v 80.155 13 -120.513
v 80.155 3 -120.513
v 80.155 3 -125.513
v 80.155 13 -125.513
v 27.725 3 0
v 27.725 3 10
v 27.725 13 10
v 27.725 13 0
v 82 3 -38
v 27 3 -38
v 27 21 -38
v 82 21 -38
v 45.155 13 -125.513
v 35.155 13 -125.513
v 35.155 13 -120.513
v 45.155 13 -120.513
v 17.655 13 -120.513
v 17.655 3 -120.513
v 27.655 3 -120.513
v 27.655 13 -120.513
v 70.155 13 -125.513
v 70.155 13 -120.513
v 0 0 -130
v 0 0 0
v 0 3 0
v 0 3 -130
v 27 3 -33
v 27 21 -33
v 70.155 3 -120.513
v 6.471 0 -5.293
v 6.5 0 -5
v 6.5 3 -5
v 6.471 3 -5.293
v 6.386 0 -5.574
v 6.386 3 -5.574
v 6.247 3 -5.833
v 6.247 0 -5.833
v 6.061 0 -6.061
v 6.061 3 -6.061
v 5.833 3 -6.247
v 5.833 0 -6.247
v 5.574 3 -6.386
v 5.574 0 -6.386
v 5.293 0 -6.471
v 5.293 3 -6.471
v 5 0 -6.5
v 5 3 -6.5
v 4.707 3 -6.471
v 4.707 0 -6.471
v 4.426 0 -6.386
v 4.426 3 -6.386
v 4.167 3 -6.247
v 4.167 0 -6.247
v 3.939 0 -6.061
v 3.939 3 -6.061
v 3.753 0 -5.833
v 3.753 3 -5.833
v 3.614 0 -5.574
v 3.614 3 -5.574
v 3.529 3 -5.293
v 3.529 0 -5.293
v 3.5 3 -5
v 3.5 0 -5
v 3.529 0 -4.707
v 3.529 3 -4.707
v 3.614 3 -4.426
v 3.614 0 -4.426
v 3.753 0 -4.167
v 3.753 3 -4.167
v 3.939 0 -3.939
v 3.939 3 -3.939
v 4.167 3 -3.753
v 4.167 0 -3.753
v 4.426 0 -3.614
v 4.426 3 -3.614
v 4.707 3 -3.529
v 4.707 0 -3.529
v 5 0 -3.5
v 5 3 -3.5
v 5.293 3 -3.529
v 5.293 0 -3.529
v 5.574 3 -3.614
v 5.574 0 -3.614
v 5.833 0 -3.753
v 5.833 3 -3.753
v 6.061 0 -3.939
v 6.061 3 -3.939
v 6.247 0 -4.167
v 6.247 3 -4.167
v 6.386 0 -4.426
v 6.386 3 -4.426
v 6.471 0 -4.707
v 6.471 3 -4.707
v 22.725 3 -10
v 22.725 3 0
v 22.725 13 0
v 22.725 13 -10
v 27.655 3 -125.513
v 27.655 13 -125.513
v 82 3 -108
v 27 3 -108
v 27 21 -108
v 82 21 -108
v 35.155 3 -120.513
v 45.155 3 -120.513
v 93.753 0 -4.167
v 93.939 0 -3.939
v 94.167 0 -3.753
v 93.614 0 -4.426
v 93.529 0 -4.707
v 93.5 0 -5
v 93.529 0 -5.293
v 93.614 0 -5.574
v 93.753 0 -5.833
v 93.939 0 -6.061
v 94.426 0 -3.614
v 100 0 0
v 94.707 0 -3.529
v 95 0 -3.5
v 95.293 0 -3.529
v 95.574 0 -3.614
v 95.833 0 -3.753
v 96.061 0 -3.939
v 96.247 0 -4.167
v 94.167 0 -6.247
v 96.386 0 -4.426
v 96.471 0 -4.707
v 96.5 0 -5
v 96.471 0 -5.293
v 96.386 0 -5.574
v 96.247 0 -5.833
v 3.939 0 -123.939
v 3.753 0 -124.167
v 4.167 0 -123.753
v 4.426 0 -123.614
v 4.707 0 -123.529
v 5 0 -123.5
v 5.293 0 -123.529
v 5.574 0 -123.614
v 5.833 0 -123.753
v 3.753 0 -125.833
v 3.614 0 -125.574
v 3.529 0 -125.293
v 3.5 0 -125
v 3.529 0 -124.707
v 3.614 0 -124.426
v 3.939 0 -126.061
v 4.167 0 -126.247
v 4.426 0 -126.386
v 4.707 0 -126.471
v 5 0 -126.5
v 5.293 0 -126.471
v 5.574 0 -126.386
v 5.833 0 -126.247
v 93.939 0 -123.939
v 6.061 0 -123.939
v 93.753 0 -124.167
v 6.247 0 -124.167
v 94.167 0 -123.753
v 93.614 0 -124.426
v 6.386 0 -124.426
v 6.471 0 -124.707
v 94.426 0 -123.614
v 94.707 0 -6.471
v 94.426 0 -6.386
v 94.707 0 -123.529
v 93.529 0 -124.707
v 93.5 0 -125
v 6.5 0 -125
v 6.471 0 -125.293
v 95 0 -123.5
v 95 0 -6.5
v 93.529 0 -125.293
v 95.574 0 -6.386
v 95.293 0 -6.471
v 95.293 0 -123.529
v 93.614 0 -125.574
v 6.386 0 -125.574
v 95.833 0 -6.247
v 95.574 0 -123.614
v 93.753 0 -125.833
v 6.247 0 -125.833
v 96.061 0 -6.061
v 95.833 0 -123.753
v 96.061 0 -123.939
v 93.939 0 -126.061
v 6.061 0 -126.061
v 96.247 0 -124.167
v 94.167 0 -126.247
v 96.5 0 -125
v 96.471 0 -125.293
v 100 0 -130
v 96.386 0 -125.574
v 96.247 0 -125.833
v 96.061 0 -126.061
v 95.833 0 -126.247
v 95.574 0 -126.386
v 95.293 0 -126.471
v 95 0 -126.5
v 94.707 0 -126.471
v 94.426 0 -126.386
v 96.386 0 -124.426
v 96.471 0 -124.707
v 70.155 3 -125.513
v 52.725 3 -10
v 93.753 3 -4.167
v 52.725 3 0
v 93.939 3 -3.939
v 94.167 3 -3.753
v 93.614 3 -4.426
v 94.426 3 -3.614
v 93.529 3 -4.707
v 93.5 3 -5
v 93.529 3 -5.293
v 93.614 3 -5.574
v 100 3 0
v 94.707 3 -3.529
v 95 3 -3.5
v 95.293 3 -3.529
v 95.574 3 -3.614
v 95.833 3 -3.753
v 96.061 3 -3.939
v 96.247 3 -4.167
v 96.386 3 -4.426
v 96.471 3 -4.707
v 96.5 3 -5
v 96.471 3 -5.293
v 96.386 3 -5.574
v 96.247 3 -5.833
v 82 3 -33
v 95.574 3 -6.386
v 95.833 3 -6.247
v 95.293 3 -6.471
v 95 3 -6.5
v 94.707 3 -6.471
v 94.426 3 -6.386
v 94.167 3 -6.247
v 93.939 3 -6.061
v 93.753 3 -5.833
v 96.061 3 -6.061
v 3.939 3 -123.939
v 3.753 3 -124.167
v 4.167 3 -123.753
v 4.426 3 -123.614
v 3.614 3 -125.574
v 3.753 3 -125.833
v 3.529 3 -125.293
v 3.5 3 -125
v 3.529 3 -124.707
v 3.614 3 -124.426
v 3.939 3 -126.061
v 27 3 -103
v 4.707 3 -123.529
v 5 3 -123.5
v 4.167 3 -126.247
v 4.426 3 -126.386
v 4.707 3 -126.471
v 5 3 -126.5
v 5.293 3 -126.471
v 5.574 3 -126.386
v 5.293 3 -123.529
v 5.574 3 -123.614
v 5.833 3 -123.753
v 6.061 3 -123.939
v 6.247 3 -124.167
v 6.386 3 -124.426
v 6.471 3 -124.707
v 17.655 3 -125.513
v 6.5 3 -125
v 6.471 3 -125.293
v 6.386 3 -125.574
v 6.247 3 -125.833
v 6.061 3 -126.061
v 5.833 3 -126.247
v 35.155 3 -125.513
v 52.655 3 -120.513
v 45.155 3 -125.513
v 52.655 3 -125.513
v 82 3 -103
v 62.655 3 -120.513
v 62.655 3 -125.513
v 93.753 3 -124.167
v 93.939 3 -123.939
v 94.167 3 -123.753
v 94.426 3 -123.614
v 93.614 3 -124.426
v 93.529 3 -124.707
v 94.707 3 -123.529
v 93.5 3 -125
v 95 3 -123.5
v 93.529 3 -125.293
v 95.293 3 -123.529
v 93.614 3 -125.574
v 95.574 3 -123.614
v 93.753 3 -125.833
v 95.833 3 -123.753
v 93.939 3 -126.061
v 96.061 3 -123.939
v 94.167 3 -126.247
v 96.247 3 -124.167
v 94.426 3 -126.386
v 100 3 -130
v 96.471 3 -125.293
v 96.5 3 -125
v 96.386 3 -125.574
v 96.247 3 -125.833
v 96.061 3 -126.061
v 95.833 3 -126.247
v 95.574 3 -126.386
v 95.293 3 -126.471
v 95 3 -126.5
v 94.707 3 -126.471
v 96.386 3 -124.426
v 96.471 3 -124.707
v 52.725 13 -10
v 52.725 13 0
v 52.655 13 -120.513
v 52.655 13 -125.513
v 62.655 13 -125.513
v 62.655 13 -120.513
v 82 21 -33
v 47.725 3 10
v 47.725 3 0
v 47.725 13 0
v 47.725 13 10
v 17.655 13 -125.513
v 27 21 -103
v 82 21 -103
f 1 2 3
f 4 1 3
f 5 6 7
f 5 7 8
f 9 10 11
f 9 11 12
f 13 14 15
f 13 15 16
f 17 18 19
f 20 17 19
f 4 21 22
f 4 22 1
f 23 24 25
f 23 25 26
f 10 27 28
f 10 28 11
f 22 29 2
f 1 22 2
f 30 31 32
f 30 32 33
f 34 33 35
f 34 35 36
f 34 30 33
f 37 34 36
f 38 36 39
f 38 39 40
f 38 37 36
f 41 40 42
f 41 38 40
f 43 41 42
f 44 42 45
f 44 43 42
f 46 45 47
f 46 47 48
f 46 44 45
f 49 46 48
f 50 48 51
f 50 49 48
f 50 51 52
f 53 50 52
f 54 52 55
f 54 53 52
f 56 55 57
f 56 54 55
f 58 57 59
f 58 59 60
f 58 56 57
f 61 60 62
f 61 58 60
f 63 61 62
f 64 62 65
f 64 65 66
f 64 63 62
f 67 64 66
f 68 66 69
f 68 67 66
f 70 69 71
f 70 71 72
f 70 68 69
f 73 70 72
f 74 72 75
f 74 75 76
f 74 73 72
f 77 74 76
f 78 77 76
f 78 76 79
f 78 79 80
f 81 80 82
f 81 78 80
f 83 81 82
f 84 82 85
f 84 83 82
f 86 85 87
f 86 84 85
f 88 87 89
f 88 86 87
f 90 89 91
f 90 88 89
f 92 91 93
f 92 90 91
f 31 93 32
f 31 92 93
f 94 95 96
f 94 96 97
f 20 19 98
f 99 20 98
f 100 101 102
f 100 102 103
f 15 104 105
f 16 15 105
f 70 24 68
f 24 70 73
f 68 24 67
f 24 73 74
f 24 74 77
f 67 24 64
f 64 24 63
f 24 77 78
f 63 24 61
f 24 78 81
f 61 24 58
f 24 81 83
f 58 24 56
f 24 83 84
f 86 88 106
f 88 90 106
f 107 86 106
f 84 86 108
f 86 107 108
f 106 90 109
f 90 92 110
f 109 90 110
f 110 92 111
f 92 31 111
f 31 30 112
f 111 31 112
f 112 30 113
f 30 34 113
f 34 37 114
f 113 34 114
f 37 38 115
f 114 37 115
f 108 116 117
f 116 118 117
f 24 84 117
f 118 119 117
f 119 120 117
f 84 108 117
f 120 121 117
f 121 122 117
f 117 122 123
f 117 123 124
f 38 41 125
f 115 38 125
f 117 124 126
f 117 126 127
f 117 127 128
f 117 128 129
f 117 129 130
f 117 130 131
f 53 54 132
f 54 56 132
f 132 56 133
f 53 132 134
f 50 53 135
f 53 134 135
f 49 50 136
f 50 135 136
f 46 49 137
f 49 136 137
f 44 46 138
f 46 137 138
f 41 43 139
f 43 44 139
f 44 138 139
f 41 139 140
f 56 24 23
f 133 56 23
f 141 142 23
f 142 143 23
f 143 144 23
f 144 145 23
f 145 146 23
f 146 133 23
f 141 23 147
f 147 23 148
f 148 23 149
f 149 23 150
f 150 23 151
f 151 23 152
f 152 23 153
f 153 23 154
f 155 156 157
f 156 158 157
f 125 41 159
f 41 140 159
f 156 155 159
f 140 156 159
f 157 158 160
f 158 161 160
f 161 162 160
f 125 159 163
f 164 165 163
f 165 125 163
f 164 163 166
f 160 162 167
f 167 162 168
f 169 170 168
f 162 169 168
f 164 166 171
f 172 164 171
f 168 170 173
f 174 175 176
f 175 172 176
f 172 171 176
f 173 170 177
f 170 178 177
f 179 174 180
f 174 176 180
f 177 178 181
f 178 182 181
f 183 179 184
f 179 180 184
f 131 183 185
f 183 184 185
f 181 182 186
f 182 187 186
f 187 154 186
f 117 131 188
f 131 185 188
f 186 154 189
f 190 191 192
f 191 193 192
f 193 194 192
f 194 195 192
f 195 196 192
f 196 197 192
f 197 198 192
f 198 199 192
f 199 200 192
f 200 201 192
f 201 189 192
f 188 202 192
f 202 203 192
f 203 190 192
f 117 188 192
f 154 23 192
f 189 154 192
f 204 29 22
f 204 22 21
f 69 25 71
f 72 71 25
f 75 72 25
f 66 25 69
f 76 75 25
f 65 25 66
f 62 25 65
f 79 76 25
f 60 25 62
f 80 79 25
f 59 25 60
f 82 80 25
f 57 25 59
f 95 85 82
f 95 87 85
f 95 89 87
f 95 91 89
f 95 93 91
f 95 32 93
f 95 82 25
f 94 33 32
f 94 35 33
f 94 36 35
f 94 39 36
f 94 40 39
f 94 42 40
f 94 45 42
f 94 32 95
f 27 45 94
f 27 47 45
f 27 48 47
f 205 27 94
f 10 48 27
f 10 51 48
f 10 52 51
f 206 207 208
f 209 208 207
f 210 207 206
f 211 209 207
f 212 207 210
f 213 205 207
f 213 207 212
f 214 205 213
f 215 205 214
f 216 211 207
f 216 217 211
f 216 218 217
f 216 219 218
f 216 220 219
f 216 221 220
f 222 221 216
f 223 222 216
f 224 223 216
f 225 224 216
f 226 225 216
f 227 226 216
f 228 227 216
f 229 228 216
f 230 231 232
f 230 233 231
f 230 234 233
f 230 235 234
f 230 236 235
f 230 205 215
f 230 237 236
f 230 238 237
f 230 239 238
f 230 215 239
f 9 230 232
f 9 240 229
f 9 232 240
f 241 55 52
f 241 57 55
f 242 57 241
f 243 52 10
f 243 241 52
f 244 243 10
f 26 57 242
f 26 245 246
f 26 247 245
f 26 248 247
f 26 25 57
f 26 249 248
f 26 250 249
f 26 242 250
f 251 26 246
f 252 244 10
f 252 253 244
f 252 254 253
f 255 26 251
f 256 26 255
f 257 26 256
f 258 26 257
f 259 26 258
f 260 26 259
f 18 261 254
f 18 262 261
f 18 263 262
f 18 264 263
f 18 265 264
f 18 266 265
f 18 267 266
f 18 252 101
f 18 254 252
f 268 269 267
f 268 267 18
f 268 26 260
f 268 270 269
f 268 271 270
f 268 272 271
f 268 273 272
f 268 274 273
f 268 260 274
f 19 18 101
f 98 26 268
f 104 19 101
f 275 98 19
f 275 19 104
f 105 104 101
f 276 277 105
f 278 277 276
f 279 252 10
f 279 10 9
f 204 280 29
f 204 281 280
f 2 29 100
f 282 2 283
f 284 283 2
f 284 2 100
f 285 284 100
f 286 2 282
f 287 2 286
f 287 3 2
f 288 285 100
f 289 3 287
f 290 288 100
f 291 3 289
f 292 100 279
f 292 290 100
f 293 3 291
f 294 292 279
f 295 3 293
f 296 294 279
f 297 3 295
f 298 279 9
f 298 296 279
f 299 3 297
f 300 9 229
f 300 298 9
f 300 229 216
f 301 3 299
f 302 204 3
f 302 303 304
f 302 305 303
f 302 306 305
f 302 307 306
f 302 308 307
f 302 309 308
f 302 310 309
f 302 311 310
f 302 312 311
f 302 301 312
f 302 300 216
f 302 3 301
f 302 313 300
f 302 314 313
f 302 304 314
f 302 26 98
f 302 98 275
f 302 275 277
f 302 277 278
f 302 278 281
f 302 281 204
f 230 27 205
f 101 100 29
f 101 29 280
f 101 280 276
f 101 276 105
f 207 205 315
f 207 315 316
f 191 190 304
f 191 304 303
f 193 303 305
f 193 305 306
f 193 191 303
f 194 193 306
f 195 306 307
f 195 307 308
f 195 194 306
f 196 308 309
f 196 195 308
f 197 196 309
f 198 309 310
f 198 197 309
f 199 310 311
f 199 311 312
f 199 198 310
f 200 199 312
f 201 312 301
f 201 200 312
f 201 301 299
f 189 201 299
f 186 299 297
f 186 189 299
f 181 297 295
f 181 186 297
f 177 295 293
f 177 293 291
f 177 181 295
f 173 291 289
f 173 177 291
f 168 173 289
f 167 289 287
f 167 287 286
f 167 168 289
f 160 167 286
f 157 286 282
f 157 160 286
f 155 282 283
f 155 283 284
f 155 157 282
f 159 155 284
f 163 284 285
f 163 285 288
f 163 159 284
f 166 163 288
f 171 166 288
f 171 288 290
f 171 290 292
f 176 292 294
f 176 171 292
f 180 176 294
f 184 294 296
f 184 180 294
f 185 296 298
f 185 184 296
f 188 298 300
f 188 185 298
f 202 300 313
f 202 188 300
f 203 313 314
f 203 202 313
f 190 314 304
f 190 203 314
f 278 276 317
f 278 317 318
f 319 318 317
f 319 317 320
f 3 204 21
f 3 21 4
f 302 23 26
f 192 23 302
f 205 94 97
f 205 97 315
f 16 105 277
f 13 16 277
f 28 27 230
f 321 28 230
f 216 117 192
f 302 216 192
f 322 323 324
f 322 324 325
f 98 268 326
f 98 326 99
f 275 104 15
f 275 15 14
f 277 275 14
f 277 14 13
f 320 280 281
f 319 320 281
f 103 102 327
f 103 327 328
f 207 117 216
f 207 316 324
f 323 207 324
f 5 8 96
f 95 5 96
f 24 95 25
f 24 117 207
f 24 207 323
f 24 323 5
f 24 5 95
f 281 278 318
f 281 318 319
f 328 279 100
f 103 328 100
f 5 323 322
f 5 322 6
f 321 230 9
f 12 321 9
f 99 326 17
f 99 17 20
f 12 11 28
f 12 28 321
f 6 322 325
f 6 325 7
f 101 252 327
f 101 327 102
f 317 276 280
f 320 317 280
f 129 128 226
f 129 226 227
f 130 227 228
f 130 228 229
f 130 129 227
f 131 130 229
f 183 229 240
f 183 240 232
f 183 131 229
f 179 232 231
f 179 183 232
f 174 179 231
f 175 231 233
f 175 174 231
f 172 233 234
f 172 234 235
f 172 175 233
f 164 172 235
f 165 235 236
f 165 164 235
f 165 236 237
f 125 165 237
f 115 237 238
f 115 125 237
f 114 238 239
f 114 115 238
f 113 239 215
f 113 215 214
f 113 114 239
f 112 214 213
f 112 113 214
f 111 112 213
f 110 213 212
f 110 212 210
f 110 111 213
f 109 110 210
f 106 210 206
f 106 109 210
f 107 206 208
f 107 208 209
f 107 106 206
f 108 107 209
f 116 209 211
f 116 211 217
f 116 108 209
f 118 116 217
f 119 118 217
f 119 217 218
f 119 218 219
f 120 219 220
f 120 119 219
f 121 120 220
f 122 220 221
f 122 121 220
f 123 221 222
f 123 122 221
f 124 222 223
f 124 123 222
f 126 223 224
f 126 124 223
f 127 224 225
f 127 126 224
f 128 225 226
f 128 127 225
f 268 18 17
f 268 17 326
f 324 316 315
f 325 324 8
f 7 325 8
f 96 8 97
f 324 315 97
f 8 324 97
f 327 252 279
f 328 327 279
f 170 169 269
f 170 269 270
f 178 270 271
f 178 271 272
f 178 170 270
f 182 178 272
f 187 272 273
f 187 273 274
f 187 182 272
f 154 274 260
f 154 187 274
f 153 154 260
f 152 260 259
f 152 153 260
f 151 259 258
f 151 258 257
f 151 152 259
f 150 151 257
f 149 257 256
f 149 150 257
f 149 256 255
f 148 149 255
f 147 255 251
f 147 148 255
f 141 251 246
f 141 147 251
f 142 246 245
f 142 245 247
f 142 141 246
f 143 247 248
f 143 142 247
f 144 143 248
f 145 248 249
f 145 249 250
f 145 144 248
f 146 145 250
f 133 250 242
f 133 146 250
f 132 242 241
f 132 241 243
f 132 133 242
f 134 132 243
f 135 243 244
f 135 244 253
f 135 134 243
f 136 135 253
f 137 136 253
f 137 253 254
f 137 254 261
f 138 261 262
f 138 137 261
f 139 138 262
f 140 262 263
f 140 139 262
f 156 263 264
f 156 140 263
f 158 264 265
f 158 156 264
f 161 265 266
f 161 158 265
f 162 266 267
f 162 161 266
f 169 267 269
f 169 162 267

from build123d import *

# Parameters (mm, degrees)
ESQUISSE1_W      = 100
ESQUISSE1_H      = 130
ESQUISSE1_R      = 1.5
EXTRUSION1_DEPTH = 3
ESQUISSE2_W      = 55
ESQUISSE2_H      = 5
EXTRUSION2_DEPTH = 18
EXTRUSION3_DEPTH = 10
ESQUISSE4_W      = 10
ESQUISSE4_H      = 5
EXTRUSION4_DEPTH = 10


with BuildPart() as part:
    # Esquisse1 → Extrusion1 (new body)
    with BuildSketch(Plane(origin=(0, 0, 0), x_dir=(1, 0, 0), z_dir=(0, 1, 0))):
        with Locations((50, 65)):
            Rectangle(ESQUISSE1_W, ESQUISSE1_H)
        with Locations((5, 125)):
            Circle(ESQUISSE1_R, mode=Mode.SUBTRACT)
        with Locations((95, 125)):
            Circle(ESQUISSE1_R, mode=Mode.SUBTRACT)
        with Locations((95, 5)):
            Circle(ESQUISSE1_R, mode=Mode.SUBTRACT)
        with Locations((5, 5)):
            Circle(ESQUISSE1_R, mode=Mode.SUBTRACT)
    extrude(amount=EXTRUSION1_DEPTH)

    # Esquisse2 → Extrusion2 (add)
    with BuildSketch(Plane(origin=(0, 3, 0), x_dir=(1, 0, 0), z_dir=(0, 1, 0))):
        with Locations((54.5, 105.5)):
            Rectangle(ESQUISSE2_W, ESQUISSE2_H)
        with Locations((54.5, 35.5)):
            Rectangle(ESQUISSE2_W, ESQUISSE2_H)
    extrude(amount=EXTRUSION2_DEPTH)

    # Esquisse3 → Extrusion3 (add)
    with BuildSketch(Plane(origin=(0, 3, 0), x_dir=(1, 0, 0), z_dir=(0, 1, 0))):
        Polygon((22.725382584, 0), (22.725382584, 10), (52.725382584, 10), (52.725382584, 0), (47.725382584, 0), (47.725382584, -10), (27.725382584, -10), (27.725382584, 0), align=None)
    extrude(amount=EXTRUSION3_DEPTH)

    # Esquisse4 → Extrusion4 (add)
    with BuildSketch(Plane(origin=(0, 3, 0), x_dir=(1, 0, 0), z_dir=(0, 1, 0))):
        with Locations((22.654691777, 123.012698359)):
            Rectangle(ESQUISSE4_W, ESQUISSE4_H)
        with Locations((40.154691777, 123.012698359)):
            Rectangle(ESQUISSE4_W, ESQUISSE4_H)
        with Locations((57.654691777, 123.012698359)):
            Rectangle(ESQUISSE4_W, ESQUISSE4_H)
        with Locations((75.154691777, 123.012698359)):
            Rectangle(ESQUISSE4_W, ESQUISSE4_H)
    extrude(amount=EXTRUSION4_DEPTH)


solid = part.part
